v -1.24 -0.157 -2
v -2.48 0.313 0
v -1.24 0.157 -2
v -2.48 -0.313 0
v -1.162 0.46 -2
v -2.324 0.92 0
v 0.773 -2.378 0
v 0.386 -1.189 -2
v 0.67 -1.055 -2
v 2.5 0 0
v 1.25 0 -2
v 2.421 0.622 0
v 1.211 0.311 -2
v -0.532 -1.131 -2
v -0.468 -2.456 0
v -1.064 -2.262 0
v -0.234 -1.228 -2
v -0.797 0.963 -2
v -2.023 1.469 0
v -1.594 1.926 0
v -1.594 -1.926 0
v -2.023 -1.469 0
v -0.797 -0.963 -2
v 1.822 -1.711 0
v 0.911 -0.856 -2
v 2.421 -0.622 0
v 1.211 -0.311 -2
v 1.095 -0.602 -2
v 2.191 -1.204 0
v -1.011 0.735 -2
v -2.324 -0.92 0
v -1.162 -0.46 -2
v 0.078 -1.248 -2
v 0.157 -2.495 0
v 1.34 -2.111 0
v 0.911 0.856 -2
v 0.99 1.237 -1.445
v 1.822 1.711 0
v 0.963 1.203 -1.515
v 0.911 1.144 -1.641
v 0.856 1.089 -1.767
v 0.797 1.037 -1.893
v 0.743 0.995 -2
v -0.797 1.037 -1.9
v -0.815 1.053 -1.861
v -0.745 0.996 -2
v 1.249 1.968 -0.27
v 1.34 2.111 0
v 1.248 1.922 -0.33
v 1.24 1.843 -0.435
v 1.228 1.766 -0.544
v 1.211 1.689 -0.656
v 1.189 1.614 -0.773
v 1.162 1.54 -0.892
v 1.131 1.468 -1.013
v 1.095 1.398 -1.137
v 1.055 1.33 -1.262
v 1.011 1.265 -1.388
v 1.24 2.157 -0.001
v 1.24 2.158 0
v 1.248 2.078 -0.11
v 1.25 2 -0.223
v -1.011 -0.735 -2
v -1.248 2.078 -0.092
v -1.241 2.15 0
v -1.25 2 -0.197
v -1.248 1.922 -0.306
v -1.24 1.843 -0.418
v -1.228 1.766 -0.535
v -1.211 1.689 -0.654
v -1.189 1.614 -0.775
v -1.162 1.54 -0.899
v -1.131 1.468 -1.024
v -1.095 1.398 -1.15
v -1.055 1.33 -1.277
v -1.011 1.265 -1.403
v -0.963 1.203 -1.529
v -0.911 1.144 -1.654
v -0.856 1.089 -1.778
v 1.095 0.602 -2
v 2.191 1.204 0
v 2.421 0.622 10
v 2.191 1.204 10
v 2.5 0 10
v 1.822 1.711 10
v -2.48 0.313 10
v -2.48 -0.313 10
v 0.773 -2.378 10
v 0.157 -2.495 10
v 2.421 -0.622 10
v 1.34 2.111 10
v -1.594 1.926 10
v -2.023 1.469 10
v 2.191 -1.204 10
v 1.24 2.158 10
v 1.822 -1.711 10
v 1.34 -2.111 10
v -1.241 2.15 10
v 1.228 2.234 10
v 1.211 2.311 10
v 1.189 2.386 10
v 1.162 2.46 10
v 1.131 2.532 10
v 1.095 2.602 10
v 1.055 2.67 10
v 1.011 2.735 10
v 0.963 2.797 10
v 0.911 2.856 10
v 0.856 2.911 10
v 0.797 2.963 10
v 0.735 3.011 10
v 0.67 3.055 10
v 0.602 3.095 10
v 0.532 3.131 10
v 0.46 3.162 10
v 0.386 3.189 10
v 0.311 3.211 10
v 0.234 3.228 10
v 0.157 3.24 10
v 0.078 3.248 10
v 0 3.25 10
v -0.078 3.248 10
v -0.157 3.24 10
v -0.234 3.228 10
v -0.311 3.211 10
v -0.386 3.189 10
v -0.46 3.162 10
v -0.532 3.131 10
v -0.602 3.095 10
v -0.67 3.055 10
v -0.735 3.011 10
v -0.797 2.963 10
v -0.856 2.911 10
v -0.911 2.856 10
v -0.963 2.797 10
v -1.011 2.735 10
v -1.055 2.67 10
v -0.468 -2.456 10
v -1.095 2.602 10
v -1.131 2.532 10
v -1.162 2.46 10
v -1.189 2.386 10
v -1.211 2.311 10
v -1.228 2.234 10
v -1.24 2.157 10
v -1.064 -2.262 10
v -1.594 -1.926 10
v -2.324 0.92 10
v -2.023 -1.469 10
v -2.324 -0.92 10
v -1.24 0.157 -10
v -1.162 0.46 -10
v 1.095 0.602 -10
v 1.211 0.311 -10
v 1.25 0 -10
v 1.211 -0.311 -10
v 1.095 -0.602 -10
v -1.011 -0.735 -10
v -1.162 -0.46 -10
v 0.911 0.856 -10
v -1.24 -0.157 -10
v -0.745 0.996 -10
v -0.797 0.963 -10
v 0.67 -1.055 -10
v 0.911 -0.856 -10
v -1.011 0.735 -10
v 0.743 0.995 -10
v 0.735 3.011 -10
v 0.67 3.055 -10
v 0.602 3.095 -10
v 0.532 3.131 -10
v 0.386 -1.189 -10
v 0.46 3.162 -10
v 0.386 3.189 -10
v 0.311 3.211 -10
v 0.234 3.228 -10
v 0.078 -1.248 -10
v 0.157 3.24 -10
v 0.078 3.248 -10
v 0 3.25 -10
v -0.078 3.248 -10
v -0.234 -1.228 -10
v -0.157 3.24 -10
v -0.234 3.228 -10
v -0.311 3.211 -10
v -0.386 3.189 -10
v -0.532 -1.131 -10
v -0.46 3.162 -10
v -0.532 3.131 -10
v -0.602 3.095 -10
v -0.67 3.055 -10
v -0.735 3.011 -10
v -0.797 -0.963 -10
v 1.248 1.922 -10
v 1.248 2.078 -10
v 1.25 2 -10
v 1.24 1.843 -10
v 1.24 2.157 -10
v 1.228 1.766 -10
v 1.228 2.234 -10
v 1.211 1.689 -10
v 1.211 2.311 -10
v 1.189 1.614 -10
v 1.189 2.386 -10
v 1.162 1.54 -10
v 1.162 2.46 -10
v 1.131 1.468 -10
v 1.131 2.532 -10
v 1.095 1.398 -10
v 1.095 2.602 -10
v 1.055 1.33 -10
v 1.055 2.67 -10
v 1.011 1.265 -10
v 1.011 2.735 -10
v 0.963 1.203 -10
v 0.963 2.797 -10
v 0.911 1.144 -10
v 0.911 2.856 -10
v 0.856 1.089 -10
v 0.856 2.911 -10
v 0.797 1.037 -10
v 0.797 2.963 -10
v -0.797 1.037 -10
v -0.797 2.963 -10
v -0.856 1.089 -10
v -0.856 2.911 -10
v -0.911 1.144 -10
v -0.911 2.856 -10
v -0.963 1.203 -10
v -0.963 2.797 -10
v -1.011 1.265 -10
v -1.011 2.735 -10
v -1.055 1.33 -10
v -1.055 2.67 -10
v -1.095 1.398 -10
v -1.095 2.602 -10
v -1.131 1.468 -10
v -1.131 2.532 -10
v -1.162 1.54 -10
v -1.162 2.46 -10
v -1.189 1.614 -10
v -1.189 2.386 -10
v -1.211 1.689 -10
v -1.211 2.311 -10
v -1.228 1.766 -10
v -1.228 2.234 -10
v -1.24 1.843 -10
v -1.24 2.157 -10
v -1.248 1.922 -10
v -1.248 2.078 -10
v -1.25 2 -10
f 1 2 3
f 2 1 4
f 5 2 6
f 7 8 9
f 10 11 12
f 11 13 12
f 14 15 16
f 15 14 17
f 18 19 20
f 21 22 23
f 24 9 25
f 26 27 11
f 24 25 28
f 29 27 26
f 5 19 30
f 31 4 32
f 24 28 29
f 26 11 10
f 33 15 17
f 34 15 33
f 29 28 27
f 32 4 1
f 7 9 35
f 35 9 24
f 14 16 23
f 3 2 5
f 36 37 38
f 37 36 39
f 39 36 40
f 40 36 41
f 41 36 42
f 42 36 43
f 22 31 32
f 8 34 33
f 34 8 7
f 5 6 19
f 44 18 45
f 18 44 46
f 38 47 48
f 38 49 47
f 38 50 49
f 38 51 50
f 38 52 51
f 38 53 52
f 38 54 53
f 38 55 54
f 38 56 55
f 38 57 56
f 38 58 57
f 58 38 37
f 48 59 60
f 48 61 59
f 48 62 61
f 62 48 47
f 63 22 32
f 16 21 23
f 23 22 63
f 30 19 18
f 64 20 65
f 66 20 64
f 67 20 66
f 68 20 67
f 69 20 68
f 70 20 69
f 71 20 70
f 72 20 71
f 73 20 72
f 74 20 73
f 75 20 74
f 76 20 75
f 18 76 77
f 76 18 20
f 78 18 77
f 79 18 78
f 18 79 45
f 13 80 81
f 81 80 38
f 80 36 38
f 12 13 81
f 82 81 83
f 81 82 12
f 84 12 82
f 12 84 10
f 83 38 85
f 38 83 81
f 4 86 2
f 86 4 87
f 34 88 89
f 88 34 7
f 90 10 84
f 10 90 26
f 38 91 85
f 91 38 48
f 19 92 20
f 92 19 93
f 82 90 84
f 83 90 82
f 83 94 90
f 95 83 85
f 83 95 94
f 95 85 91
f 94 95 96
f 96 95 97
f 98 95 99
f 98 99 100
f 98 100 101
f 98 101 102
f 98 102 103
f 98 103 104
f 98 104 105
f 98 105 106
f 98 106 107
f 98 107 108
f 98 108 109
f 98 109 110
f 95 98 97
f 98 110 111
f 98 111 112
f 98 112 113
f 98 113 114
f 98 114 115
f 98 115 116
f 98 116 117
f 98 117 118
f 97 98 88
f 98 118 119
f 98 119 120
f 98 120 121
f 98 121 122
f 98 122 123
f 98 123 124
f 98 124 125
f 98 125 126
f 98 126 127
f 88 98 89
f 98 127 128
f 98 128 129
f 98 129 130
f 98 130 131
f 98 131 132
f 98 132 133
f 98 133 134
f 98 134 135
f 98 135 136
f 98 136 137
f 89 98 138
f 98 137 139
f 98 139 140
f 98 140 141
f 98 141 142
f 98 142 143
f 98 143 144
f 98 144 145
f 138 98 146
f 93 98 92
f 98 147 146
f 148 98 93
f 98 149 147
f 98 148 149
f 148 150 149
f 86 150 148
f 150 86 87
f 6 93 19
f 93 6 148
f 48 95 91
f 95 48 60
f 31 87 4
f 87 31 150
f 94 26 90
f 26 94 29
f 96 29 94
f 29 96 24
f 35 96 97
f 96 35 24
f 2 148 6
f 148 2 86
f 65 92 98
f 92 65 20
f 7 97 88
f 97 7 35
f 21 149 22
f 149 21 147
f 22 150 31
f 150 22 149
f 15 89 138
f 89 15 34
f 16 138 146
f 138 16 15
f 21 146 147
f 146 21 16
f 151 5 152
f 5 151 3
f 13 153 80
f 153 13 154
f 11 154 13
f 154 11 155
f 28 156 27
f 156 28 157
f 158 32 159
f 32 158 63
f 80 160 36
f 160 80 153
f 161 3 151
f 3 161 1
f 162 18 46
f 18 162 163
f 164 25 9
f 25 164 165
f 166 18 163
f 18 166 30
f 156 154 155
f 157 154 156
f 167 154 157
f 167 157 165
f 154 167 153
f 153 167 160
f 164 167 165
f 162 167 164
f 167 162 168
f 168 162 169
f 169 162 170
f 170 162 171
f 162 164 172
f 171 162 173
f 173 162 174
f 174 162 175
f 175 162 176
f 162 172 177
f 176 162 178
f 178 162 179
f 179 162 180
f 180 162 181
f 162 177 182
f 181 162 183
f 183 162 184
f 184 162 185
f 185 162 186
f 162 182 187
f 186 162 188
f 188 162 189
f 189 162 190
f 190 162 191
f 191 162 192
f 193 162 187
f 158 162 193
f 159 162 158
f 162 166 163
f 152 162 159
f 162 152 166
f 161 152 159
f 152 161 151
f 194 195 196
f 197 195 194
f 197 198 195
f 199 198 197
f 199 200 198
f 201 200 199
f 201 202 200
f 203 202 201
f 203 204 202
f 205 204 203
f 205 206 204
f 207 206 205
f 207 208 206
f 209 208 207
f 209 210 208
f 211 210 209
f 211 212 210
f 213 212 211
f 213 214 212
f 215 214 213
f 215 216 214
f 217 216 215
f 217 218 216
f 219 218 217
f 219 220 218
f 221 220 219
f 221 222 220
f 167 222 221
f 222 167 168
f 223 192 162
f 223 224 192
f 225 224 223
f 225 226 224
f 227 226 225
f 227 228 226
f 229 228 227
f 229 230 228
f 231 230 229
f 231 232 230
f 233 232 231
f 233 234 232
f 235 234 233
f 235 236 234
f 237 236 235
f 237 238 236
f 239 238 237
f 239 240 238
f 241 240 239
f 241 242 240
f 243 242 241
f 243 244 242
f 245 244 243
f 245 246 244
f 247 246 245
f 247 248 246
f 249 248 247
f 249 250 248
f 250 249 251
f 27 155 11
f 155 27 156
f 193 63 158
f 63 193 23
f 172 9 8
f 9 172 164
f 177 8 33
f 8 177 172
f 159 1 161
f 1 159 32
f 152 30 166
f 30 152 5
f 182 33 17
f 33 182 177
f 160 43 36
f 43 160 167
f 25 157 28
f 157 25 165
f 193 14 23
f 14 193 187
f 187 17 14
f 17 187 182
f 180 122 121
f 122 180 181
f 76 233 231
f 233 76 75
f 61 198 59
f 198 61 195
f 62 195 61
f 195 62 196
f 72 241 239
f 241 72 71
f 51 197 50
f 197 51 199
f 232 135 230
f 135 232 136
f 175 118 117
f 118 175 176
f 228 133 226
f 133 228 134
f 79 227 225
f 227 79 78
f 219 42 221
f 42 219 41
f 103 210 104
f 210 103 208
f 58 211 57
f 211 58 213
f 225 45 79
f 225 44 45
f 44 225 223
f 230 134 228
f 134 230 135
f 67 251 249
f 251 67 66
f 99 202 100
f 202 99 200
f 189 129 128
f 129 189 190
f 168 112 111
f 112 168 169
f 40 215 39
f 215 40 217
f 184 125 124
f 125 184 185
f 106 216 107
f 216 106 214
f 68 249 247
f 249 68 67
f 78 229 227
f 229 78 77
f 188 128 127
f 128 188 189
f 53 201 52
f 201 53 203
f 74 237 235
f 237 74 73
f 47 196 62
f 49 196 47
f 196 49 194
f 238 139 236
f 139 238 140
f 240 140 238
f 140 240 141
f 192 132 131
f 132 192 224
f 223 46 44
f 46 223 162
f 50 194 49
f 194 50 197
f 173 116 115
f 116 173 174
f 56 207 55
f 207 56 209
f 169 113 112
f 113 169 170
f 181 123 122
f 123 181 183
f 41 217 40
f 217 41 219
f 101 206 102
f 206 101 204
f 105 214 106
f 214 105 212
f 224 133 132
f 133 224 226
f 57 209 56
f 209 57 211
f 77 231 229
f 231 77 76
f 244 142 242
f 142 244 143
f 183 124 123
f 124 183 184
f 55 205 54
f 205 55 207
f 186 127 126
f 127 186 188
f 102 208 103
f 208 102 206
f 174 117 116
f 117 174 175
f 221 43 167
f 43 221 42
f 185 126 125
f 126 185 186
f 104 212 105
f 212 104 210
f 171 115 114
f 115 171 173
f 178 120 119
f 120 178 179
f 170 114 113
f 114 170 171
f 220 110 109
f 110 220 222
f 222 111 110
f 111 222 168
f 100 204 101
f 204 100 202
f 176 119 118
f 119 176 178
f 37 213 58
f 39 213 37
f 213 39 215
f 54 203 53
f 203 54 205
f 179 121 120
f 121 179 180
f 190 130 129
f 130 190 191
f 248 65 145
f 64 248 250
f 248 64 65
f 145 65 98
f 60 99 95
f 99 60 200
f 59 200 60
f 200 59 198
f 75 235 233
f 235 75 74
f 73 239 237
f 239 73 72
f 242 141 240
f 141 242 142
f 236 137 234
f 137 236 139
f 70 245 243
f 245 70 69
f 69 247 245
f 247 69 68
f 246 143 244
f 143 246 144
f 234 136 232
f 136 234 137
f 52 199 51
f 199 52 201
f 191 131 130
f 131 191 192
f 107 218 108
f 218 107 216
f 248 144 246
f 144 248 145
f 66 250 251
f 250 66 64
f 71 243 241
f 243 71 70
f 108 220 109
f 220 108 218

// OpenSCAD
/*
Countersink depression for tapered screw heads.
*/

module make_countersink(d1=0, d2=0, h=0, outer=10, inner=0, $fn=25){
    /*
    d1 = shaft diameter
    d2 = head diameter
    h = height of taper
    outer = height of head mass
    inner = height of shaft mass, including taper
    */
    default_taper_height = 2;
    d1 = d1 ? d1 : 2.5;
    d2 = d2 ? d2 : 5;
    h = h ? h : default_taper_height;
    inner = (inner ? inner : 10) - default_taper_height;
    
    translate([0, 0, -default_taper_height/2])
    union(){
        
        // taper
        cylinder(d1=d1, d2=d2, h=h, center=true, $fn=$fn);
    
        // big top
    	translate([0, 0, h/2])
    	cylinder(d=d2, h=outer, center=false, $fn=$fn);
        
    	// lower bottom
    	translate([0, 0, -h/2-inner])
    	cylinder(d=d1, h=inner, center=false, $fn=$fn);
	}
}

make_countersink(inner=10);

color("blue")
translate([0,2,0])
cylinder(d=2.5, h=20, center=true, $fn=100);
